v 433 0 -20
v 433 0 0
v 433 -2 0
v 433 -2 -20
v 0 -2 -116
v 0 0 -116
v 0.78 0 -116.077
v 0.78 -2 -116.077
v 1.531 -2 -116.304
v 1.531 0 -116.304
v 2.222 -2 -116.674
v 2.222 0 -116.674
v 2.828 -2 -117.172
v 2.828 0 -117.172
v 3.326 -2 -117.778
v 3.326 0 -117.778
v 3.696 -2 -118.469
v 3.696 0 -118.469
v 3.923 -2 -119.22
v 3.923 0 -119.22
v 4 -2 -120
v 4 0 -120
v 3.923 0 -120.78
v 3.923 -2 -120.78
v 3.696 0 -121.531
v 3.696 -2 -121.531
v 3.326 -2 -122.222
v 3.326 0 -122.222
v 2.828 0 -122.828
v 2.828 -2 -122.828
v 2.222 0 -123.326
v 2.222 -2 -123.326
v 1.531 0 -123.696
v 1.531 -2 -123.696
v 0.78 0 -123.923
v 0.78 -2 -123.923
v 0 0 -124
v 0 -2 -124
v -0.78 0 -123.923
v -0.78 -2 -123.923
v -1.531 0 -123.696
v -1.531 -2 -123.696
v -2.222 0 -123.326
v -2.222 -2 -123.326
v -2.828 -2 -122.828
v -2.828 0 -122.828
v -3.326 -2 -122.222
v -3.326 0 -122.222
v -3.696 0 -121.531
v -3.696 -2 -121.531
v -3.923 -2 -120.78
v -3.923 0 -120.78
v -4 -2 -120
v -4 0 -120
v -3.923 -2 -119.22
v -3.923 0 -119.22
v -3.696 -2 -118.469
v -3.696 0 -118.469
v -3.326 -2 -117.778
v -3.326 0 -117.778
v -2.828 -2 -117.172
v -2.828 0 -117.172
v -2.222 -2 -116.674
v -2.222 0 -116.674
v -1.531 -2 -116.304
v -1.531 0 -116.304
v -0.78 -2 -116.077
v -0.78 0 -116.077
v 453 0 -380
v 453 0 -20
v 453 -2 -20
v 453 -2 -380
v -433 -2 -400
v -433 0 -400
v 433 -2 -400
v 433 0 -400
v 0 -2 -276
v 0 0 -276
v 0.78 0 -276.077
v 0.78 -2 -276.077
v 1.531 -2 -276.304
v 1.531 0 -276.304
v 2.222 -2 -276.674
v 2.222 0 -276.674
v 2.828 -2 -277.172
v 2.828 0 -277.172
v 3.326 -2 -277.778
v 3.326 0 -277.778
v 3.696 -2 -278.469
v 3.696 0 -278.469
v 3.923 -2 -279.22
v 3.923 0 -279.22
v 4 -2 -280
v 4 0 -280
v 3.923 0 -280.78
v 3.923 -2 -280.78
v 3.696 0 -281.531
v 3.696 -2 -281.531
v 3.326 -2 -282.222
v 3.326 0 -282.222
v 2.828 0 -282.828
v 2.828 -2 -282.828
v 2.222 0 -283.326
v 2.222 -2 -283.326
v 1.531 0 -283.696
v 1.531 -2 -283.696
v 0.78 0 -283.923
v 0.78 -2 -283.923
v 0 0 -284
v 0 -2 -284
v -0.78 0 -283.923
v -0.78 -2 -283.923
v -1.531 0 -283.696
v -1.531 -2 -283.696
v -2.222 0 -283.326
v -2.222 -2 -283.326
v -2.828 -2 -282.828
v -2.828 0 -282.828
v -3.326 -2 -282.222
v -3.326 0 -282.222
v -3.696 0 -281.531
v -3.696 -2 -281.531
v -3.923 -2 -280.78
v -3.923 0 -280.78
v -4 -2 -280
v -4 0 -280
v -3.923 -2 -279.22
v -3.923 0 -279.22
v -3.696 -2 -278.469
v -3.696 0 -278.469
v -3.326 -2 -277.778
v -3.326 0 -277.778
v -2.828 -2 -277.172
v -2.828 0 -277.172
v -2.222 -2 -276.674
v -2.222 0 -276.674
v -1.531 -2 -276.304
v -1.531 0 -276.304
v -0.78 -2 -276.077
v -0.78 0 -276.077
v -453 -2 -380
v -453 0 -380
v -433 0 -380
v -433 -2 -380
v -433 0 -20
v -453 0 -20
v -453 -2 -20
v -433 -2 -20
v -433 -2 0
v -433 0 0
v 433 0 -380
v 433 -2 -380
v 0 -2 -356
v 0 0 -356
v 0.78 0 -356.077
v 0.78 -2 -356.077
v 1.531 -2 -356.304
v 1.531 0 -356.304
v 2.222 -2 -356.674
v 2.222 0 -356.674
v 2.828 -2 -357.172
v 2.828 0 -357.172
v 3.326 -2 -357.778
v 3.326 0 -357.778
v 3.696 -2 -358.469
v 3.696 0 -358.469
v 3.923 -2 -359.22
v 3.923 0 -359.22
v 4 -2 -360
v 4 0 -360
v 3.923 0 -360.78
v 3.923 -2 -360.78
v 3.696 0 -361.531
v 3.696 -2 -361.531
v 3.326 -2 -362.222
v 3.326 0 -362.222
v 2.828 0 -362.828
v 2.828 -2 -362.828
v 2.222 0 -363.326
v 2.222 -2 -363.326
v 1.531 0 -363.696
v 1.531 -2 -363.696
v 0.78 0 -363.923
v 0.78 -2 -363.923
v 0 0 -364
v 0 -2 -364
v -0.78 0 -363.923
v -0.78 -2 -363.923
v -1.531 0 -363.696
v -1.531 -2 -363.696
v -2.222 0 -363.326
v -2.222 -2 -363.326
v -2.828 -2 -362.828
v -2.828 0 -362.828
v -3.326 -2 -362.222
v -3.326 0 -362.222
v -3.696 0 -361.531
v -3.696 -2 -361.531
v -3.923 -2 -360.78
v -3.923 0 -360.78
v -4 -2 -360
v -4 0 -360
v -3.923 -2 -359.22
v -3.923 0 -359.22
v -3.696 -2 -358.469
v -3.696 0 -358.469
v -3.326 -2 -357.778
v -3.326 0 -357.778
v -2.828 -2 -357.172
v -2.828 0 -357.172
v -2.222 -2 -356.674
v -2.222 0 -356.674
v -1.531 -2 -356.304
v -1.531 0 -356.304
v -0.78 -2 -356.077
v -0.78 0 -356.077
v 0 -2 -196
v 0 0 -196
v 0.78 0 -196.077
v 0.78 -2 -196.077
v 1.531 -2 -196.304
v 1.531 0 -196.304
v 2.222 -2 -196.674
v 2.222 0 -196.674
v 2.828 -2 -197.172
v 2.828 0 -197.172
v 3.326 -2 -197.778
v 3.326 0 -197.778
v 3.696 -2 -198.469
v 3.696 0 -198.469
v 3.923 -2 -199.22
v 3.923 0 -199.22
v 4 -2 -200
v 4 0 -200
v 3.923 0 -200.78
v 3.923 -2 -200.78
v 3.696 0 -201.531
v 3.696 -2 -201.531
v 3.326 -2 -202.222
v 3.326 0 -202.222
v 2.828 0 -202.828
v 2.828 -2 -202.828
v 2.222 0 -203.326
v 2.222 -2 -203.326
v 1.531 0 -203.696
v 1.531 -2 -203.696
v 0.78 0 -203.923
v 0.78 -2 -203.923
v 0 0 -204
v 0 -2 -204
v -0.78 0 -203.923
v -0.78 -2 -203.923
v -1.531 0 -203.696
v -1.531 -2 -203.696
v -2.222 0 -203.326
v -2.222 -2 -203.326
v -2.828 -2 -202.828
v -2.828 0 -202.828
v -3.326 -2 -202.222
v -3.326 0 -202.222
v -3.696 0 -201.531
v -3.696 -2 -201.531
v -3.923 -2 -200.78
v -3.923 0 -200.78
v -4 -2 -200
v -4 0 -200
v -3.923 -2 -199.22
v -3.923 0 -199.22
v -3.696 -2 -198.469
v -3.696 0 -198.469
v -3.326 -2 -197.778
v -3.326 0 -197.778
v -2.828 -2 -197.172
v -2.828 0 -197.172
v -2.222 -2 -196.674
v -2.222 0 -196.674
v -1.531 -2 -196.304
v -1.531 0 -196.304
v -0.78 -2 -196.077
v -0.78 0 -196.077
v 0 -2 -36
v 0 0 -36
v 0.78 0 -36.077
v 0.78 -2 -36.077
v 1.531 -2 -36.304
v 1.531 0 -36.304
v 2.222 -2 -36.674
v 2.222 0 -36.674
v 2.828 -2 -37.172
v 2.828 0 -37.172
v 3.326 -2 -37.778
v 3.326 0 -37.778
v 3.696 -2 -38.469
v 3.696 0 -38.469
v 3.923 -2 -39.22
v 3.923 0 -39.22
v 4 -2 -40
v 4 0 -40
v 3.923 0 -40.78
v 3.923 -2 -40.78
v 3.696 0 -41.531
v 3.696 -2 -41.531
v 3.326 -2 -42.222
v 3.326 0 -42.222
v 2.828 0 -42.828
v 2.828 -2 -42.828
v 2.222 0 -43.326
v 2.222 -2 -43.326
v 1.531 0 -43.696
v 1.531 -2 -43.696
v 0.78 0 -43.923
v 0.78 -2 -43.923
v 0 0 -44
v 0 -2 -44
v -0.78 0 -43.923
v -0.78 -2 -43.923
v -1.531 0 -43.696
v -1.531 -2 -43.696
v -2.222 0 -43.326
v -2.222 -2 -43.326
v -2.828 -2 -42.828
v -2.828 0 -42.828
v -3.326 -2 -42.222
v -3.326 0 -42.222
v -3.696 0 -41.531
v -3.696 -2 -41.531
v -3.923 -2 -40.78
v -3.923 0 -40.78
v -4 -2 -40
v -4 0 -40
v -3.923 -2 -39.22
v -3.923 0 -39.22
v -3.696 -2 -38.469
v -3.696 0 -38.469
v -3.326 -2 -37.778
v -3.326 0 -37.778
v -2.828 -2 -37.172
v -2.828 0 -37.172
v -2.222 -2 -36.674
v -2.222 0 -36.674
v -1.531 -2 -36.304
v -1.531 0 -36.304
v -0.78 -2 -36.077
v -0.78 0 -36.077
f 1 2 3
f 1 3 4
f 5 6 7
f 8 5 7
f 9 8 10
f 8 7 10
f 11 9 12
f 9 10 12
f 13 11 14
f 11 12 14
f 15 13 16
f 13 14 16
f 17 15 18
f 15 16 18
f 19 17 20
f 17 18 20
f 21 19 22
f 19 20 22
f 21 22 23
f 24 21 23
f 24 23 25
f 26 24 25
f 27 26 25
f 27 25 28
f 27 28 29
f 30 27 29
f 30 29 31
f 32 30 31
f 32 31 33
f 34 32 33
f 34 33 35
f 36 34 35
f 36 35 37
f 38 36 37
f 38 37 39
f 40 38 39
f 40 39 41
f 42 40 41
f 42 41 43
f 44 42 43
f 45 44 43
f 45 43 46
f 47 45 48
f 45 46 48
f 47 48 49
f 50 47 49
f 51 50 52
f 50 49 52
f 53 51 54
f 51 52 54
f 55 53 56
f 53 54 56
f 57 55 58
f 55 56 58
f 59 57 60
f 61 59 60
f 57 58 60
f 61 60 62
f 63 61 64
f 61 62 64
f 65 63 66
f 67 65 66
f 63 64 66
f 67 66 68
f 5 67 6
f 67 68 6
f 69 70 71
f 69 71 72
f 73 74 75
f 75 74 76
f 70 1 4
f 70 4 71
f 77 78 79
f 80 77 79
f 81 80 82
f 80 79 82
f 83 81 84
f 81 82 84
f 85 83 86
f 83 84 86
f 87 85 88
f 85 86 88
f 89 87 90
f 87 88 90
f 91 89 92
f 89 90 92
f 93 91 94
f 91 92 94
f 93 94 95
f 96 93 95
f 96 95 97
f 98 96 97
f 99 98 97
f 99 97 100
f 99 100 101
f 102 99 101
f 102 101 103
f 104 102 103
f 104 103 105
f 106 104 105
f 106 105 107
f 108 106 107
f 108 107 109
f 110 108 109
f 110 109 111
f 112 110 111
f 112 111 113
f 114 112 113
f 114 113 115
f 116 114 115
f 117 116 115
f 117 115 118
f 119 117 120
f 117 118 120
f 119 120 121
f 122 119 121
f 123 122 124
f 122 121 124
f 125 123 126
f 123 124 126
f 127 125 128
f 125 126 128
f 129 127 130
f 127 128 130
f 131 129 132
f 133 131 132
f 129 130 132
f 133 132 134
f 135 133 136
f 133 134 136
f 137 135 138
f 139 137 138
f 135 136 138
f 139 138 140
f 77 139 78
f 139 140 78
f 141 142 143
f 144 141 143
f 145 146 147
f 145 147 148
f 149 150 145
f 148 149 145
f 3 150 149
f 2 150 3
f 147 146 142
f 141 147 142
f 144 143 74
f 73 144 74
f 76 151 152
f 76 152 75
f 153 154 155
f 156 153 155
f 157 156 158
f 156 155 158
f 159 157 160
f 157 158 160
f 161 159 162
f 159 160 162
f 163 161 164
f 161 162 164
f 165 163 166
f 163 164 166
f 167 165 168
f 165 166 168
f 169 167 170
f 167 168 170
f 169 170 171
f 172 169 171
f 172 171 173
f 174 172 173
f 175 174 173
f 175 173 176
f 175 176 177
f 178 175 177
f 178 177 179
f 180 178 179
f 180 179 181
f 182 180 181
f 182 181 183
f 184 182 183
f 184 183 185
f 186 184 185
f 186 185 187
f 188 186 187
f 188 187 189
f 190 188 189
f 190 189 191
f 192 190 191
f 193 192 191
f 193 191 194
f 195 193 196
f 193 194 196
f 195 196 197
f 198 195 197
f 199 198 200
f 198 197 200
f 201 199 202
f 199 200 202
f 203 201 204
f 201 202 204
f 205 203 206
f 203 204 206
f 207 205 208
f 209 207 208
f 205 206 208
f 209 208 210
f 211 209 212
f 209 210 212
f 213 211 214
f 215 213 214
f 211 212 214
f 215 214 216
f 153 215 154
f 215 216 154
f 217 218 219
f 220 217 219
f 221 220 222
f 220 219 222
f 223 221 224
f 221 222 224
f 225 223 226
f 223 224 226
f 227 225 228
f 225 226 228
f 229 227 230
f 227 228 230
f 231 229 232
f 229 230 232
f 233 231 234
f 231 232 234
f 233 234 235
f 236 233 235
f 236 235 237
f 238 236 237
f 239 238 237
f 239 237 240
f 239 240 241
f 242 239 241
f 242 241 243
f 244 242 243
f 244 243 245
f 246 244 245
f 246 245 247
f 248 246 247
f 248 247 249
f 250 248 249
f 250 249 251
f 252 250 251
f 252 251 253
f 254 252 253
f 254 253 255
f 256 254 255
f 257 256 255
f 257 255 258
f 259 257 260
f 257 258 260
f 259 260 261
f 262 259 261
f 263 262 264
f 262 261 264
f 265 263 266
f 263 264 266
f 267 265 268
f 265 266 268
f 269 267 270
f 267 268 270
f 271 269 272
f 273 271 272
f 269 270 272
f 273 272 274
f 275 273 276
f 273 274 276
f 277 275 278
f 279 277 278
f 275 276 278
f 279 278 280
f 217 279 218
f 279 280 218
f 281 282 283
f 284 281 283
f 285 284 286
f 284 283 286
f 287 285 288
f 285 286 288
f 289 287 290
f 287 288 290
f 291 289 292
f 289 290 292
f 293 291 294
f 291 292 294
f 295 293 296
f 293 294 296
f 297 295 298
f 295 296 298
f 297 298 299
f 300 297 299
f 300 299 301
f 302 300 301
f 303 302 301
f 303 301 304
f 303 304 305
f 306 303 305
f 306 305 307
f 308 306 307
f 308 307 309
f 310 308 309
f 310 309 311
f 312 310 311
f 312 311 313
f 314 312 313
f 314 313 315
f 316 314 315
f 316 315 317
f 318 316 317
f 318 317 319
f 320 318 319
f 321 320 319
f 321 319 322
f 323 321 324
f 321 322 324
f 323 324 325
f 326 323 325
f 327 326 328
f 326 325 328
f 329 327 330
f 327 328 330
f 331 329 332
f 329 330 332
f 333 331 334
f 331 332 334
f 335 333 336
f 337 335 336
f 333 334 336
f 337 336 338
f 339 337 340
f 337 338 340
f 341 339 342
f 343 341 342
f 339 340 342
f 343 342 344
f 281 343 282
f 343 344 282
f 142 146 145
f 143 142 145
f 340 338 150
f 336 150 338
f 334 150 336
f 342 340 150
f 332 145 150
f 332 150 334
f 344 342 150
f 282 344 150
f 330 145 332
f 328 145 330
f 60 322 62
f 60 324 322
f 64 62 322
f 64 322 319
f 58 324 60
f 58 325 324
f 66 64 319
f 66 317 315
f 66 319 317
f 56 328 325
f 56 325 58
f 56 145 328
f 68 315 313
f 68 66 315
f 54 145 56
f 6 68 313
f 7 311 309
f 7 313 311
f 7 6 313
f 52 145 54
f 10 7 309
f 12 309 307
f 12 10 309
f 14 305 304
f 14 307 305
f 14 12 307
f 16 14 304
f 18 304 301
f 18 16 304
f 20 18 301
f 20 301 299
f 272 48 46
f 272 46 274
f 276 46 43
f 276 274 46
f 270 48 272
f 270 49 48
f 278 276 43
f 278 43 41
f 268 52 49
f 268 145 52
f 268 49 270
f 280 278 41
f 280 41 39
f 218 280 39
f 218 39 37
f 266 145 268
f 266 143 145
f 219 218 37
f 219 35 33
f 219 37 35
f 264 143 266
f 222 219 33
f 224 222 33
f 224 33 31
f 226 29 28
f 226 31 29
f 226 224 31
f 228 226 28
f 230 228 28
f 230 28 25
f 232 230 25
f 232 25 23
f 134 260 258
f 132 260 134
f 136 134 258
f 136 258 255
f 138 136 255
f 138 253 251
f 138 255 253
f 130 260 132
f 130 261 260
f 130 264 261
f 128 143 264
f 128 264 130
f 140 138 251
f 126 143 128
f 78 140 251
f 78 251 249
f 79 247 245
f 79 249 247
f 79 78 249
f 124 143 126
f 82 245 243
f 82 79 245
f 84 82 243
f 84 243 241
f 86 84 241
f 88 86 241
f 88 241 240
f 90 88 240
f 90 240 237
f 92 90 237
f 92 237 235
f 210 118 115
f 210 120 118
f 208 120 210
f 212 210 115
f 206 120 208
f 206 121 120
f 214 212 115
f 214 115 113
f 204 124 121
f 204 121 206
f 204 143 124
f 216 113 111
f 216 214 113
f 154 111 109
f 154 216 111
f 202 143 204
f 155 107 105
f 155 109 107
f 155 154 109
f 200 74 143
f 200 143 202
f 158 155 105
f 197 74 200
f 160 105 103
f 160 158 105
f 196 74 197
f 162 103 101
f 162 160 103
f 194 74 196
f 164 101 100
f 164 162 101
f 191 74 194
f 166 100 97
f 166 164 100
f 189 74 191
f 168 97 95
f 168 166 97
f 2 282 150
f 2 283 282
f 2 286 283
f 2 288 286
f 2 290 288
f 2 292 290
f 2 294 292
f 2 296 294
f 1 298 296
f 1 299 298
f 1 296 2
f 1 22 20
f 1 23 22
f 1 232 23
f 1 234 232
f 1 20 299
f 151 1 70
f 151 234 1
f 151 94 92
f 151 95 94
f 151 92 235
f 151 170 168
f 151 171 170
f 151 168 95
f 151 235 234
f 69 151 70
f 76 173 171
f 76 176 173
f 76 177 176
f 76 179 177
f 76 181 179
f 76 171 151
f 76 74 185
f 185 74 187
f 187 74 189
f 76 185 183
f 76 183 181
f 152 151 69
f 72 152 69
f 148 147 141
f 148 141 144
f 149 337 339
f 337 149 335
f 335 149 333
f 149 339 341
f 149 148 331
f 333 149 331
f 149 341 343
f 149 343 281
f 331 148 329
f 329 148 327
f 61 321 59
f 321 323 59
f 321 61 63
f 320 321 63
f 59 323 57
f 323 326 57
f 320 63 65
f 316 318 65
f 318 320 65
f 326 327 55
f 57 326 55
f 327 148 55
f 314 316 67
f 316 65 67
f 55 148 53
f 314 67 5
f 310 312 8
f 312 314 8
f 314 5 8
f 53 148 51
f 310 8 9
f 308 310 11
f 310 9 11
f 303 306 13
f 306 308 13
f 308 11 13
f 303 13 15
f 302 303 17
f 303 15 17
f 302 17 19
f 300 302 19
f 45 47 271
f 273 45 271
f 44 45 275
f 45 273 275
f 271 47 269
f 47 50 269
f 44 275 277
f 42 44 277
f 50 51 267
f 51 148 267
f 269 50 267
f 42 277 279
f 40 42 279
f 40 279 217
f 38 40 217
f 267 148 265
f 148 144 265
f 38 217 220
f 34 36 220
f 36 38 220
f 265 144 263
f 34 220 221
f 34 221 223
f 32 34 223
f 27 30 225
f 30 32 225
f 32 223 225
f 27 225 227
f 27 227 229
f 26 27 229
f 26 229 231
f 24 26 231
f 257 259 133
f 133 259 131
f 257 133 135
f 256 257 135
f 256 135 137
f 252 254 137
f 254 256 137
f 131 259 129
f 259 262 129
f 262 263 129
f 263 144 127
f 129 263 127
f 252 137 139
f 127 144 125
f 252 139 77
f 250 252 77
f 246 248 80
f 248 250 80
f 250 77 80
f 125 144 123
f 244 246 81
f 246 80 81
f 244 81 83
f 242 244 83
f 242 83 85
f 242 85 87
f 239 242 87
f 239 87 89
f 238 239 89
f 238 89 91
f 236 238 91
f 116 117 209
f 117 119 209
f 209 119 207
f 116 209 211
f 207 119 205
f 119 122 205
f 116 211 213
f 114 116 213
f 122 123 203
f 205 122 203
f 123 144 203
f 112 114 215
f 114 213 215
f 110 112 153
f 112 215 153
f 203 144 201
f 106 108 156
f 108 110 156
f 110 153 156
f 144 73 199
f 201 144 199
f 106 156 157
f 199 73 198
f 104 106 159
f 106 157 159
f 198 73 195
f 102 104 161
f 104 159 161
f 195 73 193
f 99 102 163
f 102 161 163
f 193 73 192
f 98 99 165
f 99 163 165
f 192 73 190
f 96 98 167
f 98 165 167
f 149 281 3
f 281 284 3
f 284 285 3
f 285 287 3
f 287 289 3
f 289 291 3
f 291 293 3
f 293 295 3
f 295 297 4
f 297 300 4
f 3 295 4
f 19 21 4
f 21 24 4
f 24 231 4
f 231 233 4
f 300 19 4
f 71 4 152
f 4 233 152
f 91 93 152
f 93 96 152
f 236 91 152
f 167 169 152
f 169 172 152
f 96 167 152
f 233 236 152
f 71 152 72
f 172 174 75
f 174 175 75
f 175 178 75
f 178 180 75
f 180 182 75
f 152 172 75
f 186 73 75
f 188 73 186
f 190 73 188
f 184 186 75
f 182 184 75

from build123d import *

# Parameters (mm, degrees)
SKETCH2_W          = 906
SKETCH2_H          = 400
BASE_FLANGE1_DEPTH = 2
SKETCH7_W          = 20
SKETCH7_H          = 20
CUT_EXTRUDE1_DEPTH = 10
SKETCH8_R          = 4
CUT_EXTRUDE2_DEPTH = 10


# Sheet-metal steps are written as plain solids
with BuildPart() as part:
    # Sketch2 → Base-Flange1 (new body)
    with BuildSketch(Plane(origin=(0, 0, 0), x_dir=(1, 0, 0), z_dir=(0, 1, 0))):
        with Locations((0, 200)):
            Rectangle(SKETCH2_W, SKETCH2_H)
    extrude(amount=-BASE_FLANGE1_DEPTH)

    # Sketch7 → Cut-Extrude1 (cut)
    with BuildSketch(Plane(origin=(0, 0, 0), x_dir=(1, 0, 0), z_dir=(0, 1, 0))):
        with Locations((-443, 390)):
            Rectangle(SKETCH7_W, SKETCH7_H)
        with Locations((-443, 10)):
            Rectangle(SKETCH7_W, SKETCH7_H)
        with Locations((443, 10)):
            Rectangle(SKETCH7_W, SKETCH7_H)
        with Locations((443, 390)):
            Rectangle(SKETCH7_W, SKETCH7_H)
    extrude(amount=-CUT_EXTRUDE1_DEPTH, mode=Mode.SUBTRACT)

    # Sketch8 → Cut-Extrude2 (cut)
    with BuildSketch(Plane(origin=(0, 0, 0), x_dir=(1, 0, 0), z_dir=(0, 1, 0))):
        with Locations(Location((0, 360, 0), (0, 0, 270))):
            Circle(SKETCH8_R)
        with Locations(Location((0, 280, 0), (0, 0, 270))):
            Circle(SKETCH8_R)
        with Locations(Location((0, 200, 0), (0, 0, 270))):
            Circle(SKETCH8_R)
        with Locations(Location((0, 120, 0), (0, 0, 270))):
            Circle(SKETCH8_R)
        with Locations(Location((0, 40, 0), (0, 0, 270))):
            Circle(SKETCH8_R)
    extrude(amount=-CUT_EXTRUDE2_DEPTH, mode=Mode.SUBTRACT)


solid = part.part
